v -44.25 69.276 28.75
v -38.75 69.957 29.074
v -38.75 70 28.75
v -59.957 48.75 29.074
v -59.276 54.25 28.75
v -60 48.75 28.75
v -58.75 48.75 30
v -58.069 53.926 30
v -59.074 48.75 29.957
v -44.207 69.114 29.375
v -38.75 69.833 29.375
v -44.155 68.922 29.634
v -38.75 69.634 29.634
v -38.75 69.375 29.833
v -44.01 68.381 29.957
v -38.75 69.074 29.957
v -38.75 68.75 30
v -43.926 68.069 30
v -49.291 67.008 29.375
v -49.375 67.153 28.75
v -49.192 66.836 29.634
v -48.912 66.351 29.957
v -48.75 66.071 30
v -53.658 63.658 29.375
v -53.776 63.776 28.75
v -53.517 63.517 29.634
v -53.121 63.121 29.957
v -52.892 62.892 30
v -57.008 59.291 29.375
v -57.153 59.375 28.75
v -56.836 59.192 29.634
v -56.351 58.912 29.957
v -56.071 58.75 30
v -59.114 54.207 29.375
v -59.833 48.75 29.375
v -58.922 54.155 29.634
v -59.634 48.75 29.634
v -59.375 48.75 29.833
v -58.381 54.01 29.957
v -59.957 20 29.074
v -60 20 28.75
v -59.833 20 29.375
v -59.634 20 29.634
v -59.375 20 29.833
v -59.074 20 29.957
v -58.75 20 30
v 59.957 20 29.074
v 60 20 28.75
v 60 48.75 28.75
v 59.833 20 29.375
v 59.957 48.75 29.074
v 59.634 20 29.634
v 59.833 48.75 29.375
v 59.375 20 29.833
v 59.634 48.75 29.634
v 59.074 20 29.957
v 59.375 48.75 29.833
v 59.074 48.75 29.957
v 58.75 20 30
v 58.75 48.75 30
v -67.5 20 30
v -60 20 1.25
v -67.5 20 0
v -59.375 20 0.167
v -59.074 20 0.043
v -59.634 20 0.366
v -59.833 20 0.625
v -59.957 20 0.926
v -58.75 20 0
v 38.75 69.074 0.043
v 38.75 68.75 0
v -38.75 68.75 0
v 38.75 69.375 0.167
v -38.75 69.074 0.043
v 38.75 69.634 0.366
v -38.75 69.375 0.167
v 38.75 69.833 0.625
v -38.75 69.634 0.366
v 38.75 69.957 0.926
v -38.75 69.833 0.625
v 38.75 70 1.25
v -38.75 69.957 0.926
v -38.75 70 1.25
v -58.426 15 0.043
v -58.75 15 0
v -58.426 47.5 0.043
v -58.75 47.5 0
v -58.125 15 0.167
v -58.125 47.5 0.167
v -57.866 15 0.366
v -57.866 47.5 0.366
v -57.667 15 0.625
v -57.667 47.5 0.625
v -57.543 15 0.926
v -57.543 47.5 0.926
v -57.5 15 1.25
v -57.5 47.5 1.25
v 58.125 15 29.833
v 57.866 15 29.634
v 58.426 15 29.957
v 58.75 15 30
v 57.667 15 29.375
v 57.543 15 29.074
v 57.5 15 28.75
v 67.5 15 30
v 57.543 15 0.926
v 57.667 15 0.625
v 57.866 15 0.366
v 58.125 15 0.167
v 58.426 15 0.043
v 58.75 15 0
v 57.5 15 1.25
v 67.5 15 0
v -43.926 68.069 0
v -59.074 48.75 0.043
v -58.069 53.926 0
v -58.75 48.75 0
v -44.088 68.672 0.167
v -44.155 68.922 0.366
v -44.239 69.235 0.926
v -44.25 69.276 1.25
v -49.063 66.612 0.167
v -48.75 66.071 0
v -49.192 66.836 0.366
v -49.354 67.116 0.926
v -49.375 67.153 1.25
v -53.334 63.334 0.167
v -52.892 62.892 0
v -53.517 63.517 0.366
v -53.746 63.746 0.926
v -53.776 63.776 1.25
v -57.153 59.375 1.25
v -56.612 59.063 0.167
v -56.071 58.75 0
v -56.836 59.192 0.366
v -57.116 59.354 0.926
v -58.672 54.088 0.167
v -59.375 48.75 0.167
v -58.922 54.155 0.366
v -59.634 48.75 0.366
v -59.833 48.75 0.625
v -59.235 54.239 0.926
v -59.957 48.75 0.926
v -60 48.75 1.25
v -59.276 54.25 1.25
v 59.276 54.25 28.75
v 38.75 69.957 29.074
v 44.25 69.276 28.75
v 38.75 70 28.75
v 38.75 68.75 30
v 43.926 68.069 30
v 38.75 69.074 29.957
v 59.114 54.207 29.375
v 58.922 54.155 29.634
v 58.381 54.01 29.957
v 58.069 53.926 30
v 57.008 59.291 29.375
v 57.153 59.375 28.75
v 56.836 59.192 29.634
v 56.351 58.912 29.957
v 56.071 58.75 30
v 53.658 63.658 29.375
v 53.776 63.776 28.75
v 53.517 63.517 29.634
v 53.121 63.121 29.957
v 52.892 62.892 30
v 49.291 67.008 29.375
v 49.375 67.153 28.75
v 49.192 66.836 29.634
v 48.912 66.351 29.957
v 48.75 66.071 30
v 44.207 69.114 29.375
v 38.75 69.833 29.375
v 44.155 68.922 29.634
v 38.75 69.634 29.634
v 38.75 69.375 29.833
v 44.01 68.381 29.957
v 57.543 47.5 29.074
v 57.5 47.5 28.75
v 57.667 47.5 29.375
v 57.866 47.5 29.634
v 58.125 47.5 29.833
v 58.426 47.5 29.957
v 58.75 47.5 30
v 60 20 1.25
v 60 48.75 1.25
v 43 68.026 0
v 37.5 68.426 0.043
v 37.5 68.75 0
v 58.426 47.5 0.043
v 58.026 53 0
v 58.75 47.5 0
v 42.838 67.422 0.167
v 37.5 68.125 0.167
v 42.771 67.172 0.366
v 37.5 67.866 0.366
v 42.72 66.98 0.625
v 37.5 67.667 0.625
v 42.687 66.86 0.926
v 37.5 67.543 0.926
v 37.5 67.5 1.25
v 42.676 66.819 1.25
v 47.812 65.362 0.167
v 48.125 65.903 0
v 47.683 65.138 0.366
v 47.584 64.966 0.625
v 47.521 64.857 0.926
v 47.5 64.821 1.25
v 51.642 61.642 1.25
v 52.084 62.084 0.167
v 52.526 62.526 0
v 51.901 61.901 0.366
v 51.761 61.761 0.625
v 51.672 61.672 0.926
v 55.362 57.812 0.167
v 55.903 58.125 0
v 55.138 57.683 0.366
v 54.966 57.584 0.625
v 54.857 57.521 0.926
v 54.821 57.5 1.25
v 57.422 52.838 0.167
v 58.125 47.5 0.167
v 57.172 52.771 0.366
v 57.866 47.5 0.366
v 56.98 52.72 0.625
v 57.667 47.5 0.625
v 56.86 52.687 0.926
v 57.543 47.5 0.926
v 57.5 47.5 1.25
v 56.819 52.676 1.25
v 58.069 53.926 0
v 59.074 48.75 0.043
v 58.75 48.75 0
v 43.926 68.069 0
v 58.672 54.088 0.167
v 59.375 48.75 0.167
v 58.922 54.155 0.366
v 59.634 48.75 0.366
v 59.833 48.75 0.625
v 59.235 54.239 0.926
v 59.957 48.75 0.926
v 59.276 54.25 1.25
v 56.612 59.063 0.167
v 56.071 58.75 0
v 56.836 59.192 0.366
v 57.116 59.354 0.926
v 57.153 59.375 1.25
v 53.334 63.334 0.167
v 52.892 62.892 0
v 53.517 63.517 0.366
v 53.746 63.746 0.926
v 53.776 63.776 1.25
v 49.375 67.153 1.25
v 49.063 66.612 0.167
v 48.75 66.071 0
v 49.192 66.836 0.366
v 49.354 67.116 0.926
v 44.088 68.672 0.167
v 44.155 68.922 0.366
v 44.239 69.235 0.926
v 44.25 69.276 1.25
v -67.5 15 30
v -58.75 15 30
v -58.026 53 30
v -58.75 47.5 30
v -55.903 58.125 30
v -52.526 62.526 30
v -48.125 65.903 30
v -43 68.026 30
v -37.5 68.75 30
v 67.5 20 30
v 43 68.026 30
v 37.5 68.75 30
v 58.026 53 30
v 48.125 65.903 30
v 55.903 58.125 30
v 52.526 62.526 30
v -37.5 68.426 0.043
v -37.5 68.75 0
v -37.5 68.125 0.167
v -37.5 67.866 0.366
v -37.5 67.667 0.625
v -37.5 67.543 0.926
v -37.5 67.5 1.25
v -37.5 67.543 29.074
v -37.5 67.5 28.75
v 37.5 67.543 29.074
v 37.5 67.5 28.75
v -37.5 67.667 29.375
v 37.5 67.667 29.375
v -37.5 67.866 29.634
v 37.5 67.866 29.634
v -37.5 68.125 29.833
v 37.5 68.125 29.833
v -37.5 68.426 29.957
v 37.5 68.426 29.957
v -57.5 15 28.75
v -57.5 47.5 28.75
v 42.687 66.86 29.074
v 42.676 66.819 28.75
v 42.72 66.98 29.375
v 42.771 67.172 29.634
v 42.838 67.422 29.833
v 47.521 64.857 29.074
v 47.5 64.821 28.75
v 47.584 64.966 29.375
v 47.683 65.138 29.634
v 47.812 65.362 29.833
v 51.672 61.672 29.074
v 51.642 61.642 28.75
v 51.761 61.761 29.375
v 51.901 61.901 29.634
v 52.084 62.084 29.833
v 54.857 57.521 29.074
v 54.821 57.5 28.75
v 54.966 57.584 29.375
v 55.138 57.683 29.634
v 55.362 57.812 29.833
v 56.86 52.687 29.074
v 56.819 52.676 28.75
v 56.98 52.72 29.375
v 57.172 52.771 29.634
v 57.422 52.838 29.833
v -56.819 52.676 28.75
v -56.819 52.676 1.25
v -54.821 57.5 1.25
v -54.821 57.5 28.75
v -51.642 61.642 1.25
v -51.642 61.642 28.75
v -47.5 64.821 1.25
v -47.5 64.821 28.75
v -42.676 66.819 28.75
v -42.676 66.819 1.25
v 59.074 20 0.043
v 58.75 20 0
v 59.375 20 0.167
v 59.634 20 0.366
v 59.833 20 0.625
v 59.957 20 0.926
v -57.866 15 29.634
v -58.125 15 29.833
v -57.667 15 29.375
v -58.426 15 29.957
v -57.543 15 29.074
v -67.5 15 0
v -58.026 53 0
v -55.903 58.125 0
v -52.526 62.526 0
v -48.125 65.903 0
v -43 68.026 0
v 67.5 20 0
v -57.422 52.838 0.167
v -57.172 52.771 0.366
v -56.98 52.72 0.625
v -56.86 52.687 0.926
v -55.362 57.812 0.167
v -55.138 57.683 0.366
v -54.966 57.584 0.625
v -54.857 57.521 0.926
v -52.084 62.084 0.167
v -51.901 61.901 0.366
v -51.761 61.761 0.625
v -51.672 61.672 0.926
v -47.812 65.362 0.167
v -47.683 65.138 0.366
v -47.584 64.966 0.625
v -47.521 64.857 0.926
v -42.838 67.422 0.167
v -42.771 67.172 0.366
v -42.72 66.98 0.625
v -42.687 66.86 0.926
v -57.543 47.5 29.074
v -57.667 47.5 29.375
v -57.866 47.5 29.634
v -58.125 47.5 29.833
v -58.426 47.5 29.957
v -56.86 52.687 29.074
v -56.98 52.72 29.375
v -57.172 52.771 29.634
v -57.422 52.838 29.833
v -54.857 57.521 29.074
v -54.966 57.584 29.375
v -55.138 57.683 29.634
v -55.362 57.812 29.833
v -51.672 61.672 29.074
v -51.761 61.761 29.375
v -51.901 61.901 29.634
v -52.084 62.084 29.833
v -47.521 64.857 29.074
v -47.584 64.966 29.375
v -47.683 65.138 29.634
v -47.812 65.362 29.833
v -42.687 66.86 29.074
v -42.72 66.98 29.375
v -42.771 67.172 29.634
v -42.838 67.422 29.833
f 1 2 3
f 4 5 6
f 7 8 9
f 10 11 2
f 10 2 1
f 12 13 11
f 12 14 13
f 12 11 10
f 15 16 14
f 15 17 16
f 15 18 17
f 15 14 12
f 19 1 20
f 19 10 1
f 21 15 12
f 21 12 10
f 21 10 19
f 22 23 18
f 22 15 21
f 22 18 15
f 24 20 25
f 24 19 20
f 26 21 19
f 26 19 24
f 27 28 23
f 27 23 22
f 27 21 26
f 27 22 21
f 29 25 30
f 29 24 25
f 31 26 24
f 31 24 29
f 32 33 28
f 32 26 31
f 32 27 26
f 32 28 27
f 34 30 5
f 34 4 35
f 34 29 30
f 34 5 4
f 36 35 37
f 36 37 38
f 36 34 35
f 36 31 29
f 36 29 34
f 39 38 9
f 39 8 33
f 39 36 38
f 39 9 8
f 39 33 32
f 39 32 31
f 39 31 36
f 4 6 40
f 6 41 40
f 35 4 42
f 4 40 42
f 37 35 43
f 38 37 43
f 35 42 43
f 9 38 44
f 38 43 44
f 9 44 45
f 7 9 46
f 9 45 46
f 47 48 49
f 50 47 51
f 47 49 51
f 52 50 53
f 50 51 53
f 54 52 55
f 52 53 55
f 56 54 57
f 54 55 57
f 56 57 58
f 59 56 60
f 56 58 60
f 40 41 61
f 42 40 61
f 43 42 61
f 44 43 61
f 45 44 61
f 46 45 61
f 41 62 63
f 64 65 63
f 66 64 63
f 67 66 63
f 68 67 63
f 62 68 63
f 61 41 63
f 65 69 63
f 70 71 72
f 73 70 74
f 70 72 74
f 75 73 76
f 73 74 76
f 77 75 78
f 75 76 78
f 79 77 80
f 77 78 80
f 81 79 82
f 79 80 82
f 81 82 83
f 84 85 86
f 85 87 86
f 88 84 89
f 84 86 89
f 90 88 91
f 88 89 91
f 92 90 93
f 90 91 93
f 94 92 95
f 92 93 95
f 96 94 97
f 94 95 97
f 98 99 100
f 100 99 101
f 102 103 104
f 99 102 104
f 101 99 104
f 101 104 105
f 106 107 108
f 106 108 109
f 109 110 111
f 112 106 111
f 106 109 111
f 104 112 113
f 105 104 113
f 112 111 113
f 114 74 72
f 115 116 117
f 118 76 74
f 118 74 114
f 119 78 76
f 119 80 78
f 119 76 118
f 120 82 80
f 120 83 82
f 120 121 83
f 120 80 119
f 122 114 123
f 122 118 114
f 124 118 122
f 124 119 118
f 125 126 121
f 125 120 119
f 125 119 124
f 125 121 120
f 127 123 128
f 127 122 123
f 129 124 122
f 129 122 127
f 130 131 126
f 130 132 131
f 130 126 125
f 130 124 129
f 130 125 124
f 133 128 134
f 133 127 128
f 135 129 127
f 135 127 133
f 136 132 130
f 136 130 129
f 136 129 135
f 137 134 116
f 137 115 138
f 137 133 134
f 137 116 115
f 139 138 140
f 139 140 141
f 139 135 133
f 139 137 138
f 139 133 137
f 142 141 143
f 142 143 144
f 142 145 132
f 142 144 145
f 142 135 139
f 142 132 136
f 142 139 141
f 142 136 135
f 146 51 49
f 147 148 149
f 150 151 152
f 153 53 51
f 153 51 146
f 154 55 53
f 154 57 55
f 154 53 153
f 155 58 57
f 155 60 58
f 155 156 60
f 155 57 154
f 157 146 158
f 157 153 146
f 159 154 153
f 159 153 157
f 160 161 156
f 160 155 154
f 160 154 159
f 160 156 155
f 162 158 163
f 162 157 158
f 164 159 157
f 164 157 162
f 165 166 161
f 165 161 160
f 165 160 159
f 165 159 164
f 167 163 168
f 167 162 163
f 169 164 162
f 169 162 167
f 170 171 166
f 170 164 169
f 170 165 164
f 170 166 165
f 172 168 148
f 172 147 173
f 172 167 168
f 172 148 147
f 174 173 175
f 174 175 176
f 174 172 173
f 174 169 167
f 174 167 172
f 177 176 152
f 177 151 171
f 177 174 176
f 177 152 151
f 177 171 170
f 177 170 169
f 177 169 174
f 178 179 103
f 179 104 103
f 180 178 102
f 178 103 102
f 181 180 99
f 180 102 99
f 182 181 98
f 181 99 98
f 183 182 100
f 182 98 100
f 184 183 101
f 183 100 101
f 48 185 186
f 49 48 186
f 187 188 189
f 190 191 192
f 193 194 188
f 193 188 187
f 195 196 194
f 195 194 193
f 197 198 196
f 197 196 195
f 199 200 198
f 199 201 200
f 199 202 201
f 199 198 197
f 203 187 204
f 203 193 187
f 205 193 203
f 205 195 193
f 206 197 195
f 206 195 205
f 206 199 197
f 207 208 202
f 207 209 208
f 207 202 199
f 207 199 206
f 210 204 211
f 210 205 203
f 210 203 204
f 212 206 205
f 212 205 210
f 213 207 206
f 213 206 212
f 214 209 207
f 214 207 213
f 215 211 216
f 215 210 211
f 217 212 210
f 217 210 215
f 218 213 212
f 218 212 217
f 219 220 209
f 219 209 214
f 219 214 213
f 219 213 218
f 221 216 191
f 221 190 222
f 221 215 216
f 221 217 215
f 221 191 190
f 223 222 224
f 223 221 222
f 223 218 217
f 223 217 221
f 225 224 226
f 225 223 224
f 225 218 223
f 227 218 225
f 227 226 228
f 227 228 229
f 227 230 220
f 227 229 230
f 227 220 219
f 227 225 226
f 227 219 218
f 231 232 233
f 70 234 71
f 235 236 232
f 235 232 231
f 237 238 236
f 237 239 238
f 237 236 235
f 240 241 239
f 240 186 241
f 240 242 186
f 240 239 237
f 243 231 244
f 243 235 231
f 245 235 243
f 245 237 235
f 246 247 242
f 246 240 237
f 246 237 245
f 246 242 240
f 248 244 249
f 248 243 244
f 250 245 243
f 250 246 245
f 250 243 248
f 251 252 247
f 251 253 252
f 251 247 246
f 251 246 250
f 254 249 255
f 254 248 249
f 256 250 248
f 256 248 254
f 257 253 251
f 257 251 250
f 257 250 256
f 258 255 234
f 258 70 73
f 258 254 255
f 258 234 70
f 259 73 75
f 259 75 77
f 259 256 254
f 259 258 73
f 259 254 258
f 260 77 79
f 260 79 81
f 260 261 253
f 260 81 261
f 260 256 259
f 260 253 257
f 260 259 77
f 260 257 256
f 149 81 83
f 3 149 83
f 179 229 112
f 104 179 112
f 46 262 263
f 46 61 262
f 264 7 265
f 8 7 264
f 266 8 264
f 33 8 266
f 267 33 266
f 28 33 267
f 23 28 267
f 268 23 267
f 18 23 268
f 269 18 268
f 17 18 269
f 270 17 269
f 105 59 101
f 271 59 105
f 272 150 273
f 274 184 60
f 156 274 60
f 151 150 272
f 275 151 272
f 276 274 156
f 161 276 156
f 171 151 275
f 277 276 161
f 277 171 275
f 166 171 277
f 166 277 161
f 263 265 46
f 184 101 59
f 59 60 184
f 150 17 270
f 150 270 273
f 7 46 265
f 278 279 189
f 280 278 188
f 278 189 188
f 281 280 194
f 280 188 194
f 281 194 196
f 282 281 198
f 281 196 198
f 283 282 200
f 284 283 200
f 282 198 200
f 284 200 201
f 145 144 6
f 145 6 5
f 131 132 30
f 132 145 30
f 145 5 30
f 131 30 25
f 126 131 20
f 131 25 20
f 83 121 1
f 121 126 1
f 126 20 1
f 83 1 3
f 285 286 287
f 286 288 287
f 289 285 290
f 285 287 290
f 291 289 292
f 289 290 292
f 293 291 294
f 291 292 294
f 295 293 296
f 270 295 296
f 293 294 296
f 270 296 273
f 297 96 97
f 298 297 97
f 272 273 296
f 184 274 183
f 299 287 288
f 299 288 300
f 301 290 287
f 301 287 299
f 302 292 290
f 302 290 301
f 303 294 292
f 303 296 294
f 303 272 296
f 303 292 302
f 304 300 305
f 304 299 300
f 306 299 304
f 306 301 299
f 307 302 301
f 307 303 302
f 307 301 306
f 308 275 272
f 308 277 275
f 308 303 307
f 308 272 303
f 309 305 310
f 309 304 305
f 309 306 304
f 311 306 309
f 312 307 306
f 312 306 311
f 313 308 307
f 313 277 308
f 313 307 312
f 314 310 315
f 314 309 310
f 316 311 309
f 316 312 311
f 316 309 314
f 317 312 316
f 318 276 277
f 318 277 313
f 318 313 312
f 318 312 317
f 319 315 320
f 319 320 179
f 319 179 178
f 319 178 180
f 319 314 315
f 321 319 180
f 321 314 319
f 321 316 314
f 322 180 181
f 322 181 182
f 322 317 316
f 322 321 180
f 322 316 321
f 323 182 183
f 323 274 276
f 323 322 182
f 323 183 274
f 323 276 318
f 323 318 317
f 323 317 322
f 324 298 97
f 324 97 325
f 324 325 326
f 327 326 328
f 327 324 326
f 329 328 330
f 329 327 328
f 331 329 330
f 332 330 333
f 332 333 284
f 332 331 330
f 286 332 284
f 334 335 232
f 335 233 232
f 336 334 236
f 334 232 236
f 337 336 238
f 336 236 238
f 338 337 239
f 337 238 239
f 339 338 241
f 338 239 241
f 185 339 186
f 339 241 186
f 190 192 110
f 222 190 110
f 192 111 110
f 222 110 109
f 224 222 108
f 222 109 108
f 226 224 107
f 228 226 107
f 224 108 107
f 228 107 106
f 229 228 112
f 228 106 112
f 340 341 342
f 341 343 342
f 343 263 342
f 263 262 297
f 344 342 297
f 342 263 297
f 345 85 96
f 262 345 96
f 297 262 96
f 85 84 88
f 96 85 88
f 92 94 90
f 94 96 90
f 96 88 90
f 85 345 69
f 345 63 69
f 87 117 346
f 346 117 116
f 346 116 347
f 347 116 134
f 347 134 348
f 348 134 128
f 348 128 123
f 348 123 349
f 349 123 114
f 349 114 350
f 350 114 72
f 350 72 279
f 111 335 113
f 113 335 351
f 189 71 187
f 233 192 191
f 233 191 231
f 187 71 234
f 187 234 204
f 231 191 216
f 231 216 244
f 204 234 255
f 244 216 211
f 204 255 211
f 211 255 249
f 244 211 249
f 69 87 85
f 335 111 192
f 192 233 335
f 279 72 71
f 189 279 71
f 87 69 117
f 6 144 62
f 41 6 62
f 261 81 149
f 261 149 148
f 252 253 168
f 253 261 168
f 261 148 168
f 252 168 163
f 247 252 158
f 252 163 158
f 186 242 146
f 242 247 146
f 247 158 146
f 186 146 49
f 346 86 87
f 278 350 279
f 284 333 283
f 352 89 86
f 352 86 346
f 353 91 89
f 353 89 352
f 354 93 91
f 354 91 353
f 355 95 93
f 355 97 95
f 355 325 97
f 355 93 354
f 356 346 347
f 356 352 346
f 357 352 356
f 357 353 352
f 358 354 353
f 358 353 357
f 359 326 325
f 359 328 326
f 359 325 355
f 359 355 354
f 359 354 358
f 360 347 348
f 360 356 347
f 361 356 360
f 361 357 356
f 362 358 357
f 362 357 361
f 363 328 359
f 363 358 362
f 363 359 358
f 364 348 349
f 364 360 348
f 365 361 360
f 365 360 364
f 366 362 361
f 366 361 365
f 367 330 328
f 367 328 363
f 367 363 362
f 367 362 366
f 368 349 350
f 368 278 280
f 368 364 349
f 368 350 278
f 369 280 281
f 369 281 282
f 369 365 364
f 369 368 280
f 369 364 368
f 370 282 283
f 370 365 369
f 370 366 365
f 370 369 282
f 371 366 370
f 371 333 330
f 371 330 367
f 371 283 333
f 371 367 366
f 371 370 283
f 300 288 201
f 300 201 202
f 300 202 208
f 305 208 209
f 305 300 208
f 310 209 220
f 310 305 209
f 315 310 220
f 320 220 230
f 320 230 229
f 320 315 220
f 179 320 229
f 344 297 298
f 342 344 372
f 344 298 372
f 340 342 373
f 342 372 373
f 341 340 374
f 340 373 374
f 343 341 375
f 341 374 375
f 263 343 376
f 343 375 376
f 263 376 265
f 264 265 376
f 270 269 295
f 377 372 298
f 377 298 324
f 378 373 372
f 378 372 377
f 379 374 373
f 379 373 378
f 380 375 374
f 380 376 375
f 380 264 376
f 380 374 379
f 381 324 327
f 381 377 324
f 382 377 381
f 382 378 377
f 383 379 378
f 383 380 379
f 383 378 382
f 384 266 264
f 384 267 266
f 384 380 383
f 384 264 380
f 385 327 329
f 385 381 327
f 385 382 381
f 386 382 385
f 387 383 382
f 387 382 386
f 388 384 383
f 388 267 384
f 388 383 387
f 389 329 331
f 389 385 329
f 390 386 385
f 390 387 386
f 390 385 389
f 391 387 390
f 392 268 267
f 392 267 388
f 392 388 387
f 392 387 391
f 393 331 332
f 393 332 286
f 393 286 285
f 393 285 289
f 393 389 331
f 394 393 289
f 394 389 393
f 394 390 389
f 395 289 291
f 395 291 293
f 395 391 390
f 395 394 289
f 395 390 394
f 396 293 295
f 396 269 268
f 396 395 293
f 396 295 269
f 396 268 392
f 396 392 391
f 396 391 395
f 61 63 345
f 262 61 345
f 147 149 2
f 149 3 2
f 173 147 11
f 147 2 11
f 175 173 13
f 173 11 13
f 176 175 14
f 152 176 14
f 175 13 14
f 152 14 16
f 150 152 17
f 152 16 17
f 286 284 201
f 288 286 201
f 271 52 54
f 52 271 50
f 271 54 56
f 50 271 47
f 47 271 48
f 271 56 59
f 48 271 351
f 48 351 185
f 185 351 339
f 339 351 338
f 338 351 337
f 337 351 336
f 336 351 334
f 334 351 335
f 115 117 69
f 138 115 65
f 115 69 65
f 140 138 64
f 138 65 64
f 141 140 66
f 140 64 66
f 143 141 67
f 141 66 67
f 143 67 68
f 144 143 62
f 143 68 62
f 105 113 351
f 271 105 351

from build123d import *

# Parameters (mm, degrees)
BOSS_EXTRUDE1_DEPTH = 30
FILLET3_R           = 20
FILLET4_R           = 21.25
FILLET5_R           = 1.25


with BuildPart() as part:
    # Sketch1 → Boss-Extrude1 (new body)
    with BuildSketch(Plane.XY):
        Polygon((-67.5, 15), (-57.5, 15), (-57.5, 67.5), (57.5, 67.5), (57.5, 15), (67.5, 15), (67.5, 20), (60, 20), (60, 70), (-60, 70), (-60, 20), (-67.5, 20), align=None)
    extrude(amount=BOSS_EXTRUDE1_DEPTH)

    # Fillet3
    fillet3_edges = [part.edges().sort_by_distance(p)[0] for p in [
        (57.5, 67.5, 15),
        (-57.5, 67.5, 15),
    ]]
    fillet(fillet3_edges, radius=FILLET3_R)

    # Fillet4
    fillet4_edges = [part.edges().sort_by_distance(p)[0] for p in [
        (-60, 70, 15),
        (60, 70, 15),
    ]]
    fillet(fillet4_edges, radius=FILLET4_R)

    # Fillet5
    fillet5_edges = [part.edges().sort_by_distance(p)[0] for p in [
        (-57.5, 31.25, 0),
        (60, 34.375, 0),
        (60, 34.375, 30),
        (57.5, 31.25, 0),
        (57.5, 31.25, 30),
        (0, 67.5, 0),
        (0, 67.5, 30),
        (51.642135624, 61.642135624, 0),
        (51.642135624, 61.642135624, 30),
        (-51.642135624, 61.642135624, 0),
        (-51.642135624, 61.642135624, 30),
        (-57.5, 31.25, 30),
        (0, 70, 0),
        (0, 70, 30),
        (-60, 34.375, 0),
        (-53.7760191, 63.7760191, 0),
        (53.7760191, 63.7760191, 0),
        (-60, 34.375, 30),
        (-53.7760191, 63.7760191, 30),
        (53.7760191, 63.7760191, 30),
    ]]
    fillet(fillet5_edges, radius=FILLET5_R - 0.0001)  # a hair under: the kernel refuses the full size


solid = part.part
